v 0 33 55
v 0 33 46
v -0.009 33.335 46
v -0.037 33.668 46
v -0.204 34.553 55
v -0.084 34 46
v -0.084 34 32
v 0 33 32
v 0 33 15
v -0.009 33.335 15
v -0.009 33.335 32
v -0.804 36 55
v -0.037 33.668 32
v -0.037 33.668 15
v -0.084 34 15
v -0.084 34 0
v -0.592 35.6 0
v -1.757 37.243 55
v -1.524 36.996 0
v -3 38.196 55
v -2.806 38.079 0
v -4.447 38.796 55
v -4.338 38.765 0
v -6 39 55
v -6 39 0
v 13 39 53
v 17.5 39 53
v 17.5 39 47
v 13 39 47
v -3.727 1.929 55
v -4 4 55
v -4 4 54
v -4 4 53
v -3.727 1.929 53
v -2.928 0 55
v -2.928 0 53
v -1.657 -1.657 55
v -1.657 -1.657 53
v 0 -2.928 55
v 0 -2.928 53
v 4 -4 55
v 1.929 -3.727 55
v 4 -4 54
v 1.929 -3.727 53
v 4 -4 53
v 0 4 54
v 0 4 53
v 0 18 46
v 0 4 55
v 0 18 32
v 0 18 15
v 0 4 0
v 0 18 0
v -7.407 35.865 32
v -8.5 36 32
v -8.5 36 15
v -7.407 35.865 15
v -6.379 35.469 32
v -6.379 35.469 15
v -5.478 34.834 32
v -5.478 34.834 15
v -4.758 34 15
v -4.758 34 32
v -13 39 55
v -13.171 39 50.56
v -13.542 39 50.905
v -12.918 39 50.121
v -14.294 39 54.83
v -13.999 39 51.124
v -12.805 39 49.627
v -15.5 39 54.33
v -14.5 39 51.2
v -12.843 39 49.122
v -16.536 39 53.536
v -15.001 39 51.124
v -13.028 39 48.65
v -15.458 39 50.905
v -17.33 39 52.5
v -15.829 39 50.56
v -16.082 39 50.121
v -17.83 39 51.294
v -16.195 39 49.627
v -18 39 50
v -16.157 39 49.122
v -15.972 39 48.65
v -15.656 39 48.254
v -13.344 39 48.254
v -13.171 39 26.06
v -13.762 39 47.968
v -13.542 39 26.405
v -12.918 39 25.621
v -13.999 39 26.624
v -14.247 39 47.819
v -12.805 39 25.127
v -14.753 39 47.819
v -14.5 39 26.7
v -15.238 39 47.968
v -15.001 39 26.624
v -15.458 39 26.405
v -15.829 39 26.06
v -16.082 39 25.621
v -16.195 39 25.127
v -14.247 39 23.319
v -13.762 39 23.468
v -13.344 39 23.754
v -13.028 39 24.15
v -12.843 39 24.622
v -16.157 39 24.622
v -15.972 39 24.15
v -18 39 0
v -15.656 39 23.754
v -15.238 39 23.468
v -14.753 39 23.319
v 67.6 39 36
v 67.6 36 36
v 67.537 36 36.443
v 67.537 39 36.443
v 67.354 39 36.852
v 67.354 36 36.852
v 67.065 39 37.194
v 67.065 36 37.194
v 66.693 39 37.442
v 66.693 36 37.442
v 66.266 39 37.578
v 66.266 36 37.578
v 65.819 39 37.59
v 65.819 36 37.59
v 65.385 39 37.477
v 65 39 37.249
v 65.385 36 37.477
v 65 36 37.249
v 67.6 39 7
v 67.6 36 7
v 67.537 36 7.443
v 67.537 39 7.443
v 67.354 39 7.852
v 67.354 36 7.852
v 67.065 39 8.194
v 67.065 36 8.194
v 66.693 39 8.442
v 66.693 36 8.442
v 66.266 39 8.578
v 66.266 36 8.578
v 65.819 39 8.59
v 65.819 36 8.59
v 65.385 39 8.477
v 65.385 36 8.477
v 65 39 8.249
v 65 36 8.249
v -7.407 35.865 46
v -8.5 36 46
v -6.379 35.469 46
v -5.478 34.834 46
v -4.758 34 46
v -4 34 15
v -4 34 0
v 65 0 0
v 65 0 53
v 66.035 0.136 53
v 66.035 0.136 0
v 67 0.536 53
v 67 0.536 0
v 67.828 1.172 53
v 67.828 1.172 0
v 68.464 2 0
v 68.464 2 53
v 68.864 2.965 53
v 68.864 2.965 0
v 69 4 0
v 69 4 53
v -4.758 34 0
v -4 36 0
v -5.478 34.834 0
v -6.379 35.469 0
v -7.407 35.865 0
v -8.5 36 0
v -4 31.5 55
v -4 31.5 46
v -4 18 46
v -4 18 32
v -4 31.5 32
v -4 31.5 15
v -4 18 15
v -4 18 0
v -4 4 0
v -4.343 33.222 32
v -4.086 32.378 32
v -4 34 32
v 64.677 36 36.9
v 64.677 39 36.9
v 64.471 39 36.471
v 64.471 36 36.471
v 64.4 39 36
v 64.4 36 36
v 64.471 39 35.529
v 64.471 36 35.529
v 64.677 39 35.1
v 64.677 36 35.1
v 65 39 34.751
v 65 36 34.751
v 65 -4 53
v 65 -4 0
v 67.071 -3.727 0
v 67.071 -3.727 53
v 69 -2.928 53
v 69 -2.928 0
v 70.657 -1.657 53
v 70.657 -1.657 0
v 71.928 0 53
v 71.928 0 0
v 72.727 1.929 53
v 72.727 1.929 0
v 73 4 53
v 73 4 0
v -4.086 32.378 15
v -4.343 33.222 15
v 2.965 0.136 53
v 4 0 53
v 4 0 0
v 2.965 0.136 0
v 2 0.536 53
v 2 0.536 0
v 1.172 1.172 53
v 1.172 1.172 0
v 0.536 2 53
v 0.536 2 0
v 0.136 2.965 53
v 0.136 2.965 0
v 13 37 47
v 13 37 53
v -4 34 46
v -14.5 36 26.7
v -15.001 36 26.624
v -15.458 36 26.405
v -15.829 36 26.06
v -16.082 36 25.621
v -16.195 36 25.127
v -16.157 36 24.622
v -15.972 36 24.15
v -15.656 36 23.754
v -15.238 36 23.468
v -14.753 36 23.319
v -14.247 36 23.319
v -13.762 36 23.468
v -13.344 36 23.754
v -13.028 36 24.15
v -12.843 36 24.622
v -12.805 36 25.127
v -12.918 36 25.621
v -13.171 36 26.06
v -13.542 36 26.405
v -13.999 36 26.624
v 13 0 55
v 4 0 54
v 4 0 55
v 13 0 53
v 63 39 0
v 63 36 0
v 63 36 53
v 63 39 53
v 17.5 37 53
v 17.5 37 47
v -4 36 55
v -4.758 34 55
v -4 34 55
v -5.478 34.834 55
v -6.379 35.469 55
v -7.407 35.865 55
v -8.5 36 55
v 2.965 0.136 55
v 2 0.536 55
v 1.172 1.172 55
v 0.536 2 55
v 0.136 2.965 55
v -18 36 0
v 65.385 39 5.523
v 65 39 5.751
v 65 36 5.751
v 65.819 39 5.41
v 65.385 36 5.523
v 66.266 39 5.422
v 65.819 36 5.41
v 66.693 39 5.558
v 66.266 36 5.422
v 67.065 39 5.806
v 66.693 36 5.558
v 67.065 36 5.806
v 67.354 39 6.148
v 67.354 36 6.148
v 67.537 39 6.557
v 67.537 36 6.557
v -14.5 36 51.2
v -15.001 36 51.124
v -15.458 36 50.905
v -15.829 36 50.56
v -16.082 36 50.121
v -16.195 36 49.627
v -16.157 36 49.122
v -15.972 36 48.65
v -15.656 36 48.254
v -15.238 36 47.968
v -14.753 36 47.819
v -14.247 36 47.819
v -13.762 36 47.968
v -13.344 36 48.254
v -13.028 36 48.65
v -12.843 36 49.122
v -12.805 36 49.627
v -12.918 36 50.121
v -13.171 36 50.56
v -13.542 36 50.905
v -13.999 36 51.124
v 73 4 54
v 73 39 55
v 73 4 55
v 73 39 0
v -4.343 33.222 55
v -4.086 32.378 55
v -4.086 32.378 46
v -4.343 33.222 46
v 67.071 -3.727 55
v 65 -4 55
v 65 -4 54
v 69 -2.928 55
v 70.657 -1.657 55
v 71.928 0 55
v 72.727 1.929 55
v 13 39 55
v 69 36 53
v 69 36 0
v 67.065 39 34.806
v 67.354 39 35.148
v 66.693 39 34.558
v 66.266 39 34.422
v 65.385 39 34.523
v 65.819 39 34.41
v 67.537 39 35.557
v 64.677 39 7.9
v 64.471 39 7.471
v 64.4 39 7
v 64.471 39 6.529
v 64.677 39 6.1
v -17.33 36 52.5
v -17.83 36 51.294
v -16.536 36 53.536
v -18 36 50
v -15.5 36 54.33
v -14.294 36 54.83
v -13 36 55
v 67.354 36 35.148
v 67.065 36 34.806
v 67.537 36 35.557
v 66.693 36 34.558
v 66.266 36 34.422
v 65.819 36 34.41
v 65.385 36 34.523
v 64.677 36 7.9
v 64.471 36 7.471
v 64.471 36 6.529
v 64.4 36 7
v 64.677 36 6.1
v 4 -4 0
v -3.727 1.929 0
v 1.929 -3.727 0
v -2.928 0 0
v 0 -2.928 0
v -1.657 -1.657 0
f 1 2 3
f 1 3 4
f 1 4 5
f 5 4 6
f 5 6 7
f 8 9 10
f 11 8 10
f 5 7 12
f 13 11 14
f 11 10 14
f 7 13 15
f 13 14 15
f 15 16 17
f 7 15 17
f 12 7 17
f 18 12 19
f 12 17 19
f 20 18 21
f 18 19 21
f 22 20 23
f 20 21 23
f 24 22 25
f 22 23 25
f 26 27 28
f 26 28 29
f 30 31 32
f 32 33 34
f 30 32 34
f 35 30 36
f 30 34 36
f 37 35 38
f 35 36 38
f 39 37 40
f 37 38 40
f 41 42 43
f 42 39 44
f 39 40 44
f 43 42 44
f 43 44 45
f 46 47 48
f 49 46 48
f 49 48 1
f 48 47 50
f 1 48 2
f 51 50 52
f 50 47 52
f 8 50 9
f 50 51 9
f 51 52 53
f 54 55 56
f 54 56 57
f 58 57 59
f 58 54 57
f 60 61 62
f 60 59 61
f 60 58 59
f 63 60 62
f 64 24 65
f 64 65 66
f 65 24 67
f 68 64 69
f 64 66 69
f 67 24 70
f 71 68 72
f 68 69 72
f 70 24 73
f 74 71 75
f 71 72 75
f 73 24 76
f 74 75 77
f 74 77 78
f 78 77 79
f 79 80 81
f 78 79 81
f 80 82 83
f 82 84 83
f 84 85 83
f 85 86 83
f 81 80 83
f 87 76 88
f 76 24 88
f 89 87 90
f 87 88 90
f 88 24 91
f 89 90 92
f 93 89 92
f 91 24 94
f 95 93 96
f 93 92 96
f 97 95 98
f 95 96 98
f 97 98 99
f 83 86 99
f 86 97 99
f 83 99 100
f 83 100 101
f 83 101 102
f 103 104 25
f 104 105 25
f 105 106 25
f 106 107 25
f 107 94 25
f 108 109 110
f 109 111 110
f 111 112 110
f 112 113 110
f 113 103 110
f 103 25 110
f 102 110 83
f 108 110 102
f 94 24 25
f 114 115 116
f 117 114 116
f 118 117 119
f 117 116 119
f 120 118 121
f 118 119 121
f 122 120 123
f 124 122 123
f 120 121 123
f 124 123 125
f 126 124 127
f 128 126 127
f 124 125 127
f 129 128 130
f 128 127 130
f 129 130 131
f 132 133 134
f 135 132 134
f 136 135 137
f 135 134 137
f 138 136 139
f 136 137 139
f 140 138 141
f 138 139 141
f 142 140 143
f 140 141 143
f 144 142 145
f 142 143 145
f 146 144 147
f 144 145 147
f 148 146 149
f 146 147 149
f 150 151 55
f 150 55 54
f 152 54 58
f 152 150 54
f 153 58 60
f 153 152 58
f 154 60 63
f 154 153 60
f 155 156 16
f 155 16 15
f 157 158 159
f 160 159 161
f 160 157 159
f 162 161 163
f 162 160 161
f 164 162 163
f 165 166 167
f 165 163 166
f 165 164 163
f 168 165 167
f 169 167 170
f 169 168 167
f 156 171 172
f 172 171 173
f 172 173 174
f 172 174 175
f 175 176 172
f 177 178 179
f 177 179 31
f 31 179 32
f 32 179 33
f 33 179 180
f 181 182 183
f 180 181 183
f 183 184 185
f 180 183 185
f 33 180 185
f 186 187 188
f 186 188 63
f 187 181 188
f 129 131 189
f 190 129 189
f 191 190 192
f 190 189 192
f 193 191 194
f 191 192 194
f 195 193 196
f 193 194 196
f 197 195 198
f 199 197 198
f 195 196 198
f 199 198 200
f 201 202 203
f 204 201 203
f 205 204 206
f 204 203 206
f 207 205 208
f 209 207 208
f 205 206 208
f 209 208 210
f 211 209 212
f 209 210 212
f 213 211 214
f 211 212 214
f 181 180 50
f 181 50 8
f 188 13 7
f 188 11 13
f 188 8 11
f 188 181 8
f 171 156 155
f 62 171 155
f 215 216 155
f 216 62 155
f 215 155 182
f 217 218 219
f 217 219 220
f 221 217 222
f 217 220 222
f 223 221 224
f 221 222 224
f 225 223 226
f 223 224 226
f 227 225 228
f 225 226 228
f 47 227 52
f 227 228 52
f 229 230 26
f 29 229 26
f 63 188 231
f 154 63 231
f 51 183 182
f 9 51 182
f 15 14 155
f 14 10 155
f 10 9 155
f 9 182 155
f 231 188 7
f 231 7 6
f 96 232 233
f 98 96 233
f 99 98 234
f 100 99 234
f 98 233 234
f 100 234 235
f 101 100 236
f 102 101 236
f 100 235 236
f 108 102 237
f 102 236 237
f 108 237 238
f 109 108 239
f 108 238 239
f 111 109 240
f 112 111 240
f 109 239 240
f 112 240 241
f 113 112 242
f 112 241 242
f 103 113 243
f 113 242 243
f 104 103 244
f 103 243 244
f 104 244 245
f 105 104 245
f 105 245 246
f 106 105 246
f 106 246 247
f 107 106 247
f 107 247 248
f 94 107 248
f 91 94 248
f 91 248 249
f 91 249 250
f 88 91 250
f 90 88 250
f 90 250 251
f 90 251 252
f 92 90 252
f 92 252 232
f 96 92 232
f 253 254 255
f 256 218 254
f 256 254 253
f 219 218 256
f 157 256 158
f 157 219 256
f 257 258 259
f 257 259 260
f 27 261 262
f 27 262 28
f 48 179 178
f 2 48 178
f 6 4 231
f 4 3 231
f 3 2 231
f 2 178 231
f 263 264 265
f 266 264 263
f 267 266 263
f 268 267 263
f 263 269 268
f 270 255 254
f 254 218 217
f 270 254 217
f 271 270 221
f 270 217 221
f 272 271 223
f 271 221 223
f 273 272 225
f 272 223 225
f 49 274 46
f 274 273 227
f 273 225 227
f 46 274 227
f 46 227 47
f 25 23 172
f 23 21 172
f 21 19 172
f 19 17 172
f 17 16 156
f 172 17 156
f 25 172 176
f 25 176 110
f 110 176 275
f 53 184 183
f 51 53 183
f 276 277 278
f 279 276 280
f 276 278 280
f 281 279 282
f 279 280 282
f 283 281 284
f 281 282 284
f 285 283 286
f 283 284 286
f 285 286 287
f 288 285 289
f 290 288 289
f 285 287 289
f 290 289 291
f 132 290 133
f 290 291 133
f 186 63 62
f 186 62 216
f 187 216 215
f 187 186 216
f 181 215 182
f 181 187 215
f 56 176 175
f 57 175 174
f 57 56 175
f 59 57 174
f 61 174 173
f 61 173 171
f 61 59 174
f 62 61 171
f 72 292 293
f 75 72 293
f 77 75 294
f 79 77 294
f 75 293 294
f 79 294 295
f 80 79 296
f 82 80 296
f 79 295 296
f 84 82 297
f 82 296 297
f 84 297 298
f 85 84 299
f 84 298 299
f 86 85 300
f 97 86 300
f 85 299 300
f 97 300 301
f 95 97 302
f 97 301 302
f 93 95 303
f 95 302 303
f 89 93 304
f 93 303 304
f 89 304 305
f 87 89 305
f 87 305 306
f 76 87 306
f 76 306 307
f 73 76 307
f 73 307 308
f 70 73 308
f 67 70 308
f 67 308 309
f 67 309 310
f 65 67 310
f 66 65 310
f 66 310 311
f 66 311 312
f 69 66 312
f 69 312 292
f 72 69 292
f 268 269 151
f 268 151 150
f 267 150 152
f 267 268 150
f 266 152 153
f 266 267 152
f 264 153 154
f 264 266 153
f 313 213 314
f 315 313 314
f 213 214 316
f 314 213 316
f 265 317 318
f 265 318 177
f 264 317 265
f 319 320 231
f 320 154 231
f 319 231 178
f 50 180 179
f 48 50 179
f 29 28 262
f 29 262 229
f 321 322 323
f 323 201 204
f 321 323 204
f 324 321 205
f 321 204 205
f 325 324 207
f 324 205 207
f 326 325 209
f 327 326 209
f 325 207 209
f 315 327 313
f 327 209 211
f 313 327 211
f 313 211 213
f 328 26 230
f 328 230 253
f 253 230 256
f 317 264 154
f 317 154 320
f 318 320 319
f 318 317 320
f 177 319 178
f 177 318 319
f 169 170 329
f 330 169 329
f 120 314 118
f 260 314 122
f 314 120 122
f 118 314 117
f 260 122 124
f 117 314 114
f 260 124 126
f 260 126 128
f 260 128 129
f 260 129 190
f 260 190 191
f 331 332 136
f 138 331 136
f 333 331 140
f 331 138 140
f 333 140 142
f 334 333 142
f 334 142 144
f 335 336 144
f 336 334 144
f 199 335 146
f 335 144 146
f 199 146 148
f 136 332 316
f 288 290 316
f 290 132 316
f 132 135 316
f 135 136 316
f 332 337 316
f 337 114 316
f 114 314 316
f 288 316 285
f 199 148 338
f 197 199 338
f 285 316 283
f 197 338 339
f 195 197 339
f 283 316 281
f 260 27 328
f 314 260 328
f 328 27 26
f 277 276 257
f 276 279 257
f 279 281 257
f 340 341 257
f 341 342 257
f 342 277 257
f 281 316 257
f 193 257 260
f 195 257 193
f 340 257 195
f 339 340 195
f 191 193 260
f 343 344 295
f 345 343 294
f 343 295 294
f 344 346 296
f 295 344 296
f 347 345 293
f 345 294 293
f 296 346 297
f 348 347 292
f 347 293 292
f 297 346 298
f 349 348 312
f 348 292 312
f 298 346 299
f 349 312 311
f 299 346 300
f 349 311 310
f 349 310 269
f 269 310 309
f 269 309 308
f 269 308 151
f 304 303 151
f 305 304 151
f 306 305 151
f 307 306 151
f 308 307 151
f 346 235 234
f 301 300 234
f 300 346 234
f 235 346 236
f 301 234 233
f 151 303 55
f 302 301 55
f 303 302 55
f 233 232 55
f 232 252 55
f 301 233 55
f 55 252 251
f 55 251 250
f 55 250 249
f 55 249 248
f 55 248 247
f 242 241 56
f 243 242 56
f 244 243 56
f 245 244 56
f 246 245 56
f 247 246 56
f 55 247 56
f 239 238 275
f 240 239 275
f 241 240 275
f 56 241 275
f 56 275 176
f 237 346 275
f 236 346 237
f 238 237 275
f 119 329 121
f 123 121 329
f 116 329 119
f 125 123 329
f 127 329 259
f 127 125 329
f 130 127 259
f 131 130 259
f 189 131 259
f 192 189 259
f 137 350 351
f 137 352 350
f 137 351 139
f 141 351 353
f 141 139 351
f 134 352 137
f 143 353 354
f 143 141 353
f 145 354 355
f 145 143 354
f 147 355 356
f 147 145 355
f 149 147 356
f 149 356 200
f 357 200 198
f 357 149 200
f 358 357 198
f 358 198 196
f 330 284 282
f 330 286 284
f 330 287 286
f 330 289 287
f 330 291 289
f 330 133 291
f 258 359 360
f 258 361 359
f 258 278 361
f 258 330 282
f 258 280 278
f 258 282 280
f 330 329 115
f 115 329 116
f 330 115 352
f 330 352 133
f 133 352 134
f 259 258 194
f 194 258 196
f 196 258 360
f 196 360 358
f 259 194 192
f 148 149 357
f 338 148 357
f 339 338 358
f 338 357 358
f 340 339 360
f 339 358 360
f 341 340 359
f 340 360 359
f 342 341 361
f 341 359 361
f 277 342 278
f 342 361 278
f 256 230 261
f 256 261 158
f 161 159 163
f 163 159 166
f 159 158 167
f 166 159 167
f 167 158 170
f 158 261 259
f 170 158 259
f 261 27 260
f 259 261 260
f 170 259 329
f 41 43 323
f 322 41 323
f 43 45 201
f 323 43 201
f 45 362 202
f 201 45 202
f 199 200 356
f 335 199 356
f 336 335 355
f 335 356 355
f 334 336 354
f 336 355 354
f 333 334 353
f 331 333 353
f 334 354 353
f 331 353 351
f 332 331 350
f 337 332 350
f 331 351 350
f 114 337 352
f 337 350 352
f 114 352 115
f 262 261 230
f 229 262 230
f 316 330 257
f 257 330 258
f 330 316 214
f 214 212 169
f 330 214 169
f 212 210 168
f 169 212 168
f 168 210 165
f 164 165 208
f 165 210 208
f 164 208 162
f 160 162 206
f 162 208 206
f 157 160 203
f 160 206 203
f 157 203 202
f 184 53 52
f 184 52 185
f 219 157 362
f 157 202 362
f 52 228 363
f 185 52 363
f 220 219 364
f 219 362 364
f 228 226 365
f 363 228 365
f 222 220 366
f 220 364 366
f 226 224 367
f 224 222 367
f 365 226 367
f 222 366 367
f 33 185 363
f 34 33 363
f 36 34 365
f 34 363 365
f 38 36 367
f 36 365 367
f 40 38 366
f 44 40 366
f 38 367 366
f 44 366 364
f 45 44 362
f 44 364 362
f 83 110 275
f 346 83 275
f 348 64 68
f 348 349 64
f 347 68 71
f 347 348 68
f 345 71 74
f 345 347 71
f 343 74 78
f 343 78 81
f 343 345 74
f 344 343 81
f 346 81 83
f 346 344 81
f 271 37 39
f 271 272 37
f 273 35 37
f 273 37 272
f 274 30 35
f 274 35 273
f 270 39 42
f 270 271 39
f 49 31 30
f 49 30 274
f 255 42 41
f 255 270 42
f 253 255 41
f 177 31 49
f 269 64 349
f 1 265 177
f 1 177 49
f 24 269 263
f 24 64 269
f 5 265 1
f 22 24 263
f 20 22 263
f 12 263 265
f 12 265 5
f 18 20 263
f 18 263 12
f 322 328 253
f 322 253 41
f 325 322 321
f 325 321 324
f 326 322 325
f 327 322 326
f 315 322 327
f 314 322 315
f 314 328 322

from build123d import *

# Parameters (mm, degrees)
EXTRUDE_1_DEPTH      = 54
EXTRUDE_START        = -2
EXTRUDE_2_DEPTH      = 2
SKETCH_2_R           = 1.7
SKETCH_2_W           = 14
SKETCH_2_H           = 2
SKETCH_2_W_2         = 8
SKETCH_2_W_3         = 61
CUT_EXTRUDE_1_DEPTH  = 101.468900661
CUT_EXTRUDE_2_REACH  = 103.814
SKETCH_3_W           = 15
SKETCH_3_H           = 16
SKETCH_3_W_2         = 14
CUT_EXTRUDE_START    = -40
CUT_EXTRUDE_5_DEPTH  = 61.468900661
EXTRUDE_3_DEPTH      = 1
EXTRUDE_3_DEPTH_BACK = 1
SKETCH_6_W           = 4.5
SKETCH_6_H           = 2
EXTRUDE_4_DEPTH      = 6
FILLET_1_R           = 4.5
FILLET_2_R           = 6
FILLET_3_R           = 5


with BuildPart() as part:
    # 草图1 → 凸台-拉伸1 (new body)
    with BuildSketch(Plane.XY):
        with BuildLine():
            ThreePointArc((4, -4), (-1.656854249, -1.656854249), (-4, 4))
            Line((-4, 4), (-4, 36))
            Line((-4, 36), (-18, 36))
            Line((-18, 36), (-18, 39))
            Line((-18, 39), (0, 39))
            Line((0, 39), (0, 4))
            ThreePointArc((0, 4), (1.171572875, 1.171572875), (4, 0))
            Line((4, 0), (65, 0))
            ThreePointArc((65, 0), (67.828427125, 1.171572875), (69, 4))
            Line((69, 4), (69, 36))
            Line((69, 36), (63, 36))
            Line((63, 36), (63, 39))
            Line((63, 39), (73, 39))
            Line((73, 39), (73, 4))
            ThreePointArc((73, 4), (70.656854249, -1.656854249), (65, -4))
            Line((65, -4), (4, -4))
        make_face()
    extrude(amount=EXTRUDE_1_DEPTH)

    # 草图1<3> → 凸台-拉伸2 (add)
    with BuildSketch(Plane.XY.offset(EXTRUDE_START)):
        with BuildLine():
            Line((4, 0), (65, 0))
            ThreePointArc((65, 0), (67.828427125, 1.171572875), (69, 4))
            Line((69, 4), (69, 36))
            Line((69, 36), (63, 36))
            Line((63, 36), (63, 39))
            Line((63, 39), (0, 39))
            Line((0, 39), (0, 4))
            ThreePointArc((0, 4), (1.171572875, 1.171572875), (4, 0))
        make_face()
        with BuildLine():
            ThreePointArc((4, -4), (-1.656854249, -1.656854249), (-4, 4))
            Line((-4, 4), (-4, 36))
            Line((-4, 36), (-18, 36))
            Line((-18, 36), (-18, 39))
            Line((-18, 39), (0, 39))
            Line((0, 39), (0, 4))
            ThreePointArc((0, 4), (1.171572875, 1.171572875), (4, 0))
            Line((4, 0), (65, 0))
            ThreePointArc((65, 0), (67.828427125, 1.171572875), (69, 4))
            Line((69, 4), (69, 36))
            Line((69, 36), (63, 36))
            Line((63, 36), (63, 39))
            Line((63, 39), (73, 39))
            Line((73, 39), (73, 4))
            ThreePointArc((73, 4), (70.656854249, -1.656854249), (65, -4))
            Line((65, -4), (4, -4))
        make_face()
    extrude(amount=EXTRUDE_2_DEPTH)

    # 草图2 → 切除-拉伸1 (cut, through all)
    with BuildSketch(Plane.XZ.offset(4)):
        with Locations(Location((-14.5, 49.5, 0), (0, 0, 90))):
            Circle(SKETCH_2_R)
        with Locations(Location((-14.5, 25, 0), (0, 0, 90))):
            Circle(SKETCH_2_R)
        with Locations((-11, -1)):
            Rectangle(SKETCH_2_W, SKETCH_2_H)
        with Locations((0, -1)):
            Rectangle(SKETCH_2_W_2, SKETCH_2_H)
        with Locations((34.5, -1)):
            Rectangle(SKETCH_2_W_3, SKETCH_2_H)
        with Locations((69, -1)):
            Rectangle(SKETCH_2_W_2, SKETCH_2_H)
    extrude(amount=-CUT_EXTRUDE_1_DEPTH, mode=Mode.SUBTRACT)

    # 草图3 → 切除-拉伸2 (cut, up to next)
    with BuildSketch(Plane.ZY.offset(4), mode=Mode.PRIVATE) as cut_extrude_2_sk1:
        with Locations((7.5, 26)):
            Rectangle(SKETCH_3_W, SKETCH_3_H)
    cut_extrude_2_tool1 = extrude(cut_extrude_2_sk1.sketch, amount=-CUT_EXTRUDE_2_REACH, mode=Mode.PRIVATE) & part.part
    # 草图3 → 切除-拉伸2 (cut, up to next)
    with BuildSketch(Plane.ZY.offset(4), mode=Mode.PRIVATE) as cut_extrude_2_sk2:
        with Locations((39, 26)):
            Rectangle(SKETCH_3_W_2, SKETCH_3_H)
    cut_extrude_2_tool2 = extrude(cut_extrude_2_sk2.sketch, amount=-CUT_EXTRUDE_2_REACH, mode=Mode.PRIVATE) & part.part
    add(cut_extrude_2_tool1.solids().sort_by_distance((-4, 26, 7.5))[0], mode=Mode.SUBTRACT)
    add(cut_extrude_2_tool2.solids().sort_by_distance((-4, 26, 39))[0], mode=Mode.SUBTRACT)

    # 草图2<3> → 切除-拉伸5 (cut, through all)
    with BuildSketch(Plane.XZ.offset(4).offset(CUT_EXTRUDE_START)):
        with BuildLine():
            ThreePointArc((65, 37.2489996), (64.4, 36), (65, 34.7510004))
            Line((65, 34.7510004), (65, 37.2489996))
        make_face()
        with BuildLine():
            Line((65, 37.2489996), (65, 34.7510004))
            ThreePointArc((65, 34.7510004), (66.692820323, 34.55777949), (67.6, 36))
            ThreePointArc((67.6, 36), (66.692820323, 37.44222051), (65, 37.2489996))
        make_face()
        with BuildLine():
            ThreePointArc((65, 8.2489996), (64.4, 7), (65, 5.7510004))
            Line((65, 5.7510004), (65, 8.2489996))
        make_face()
        with BuildLine():
            Line((65, 8.2489996), (65, 5.7510004))
            ThreePointArc((65, 5.7510004), (66.692820323, 5.55777949), (67.6, 7))
            ThreePointArc((67.6, 7), (66.692820323, 8.44222051), (65, 8.2489996))
        make_face()
    extrude(amount=-CUT_EXTRUDE_5_DEPTH, mode=Mode.SUBTRACT)

    # 草图5 → 凸台-拉伸3 (add, two sides: drawn at the far end of the back side and taken through both)
    with BuildSketch(Plane.XY.offset(54).offset(-EXTRUDE_3_DEPTH_BACK)):
        with BuildLine():
            Line((73, 39), (63, 39))
            Line((63, 39), (63, 36))
            Line((63, 36), (69, 36))
            Line((69, 36), (69, 4))
            ThreePointArc((69, 4), (67.828427125, 1.171572875), (65, 0))
            Line((65, 0), (13, 0))
            Line((13, 0), (13, -4))
            Line((13, -4), (65, -4))
            ThreePointArc((65, -4), (70.656854249, -1.656854249), (73, 4))
            Line((73, 4), (73, 39))
        make_face()
        with BuildLine():
            Line((63, 39), (13, 39))
            Line((13, 39), (13, 0))
            Line((13, 0), (65, 0))
            ThreePointArc((65, 0), (67.828427125, 1.171572875), (69, 4))
            Line((69, 4), (69, 36))
            Line((69, 36), (63, 36))
            Line((63, 36), (63, 39))
        make_face()
        with BuildLine():
            Line((0, 4), (0, 39))
            Line((0, 39), (-18, 39))
            Line((-18, 39), (-18, 36))
            Line((-18, 36), (-4, 36))
            Line((-4, 36), (-4, 4))
            ThreePointArc((-4, 4), (-1.656854249, -1.656854249), (4, -4))
            Line((4, -4), (13, -4))
            Line((13, -4), (13, 0))
            Line((13, 0), (4, 0))
            ThreePointArc((4, 0), (1.171572875, 1.171572875), (0, 4))
        make_face()
    extrude(amount=EXTRUDE_3_DEPTH + EXTRUDE_3_DEPTH_BACK)

    # 草图6 → 凸台-拉伸4 (add)
    with BuildSketch(Plane(origin=(0, 0, 53), x_dir=(-1, 0, 0), z_dir=(0, 0, -1))):
        with Locations((-15.25, 38)):
            Rectangle(SKETCH_6_W, SKETCH_6_H)
    extrude(amount=EXTRUDE_4_DEPTH)

    # 圆角1
    # the kernel refuses this fillet: 4.5 mm, written as the material it adds along each edge
    with BuildSketch(Plane(origin=(-4, 36, 55), x_dir=(0, -1, 0), z_dir=(0, 0, -1))) as fillet_1_piece_1_section:
        with BuildLine():
            CenterArc((FILLET_1_R, FILLET_1_R), FILLET_1_R, 180, 90)
            Line((0, FILLET_1_R), (0, 0))
            Line((0, 0), (FILLET_1_R, 0))
        make_face()
    fillet_1_piece_1 = extrude(amount=55, mode=Mode.PRIVATE)
    fillet_1_piece_1 = split(fillet_1_piece_1, bisect_by=Plane(origin=(-4.151275194, 34, 50.5), z_dir=(0, -1, 0)), keep=Keep.TOP, mode=Mode.PRIVATE)
    fillet_1_piece_1 = split(fillet_1_piece_1, bisect_by=Plane(origin=(-4.151275194, 33.214431026, 46), z_dir=(0, 0, 1)), keep=Keep.TOP, mode=Mode.PRIVATE)
    add(fillet_1_piece_1)
    with BuildSketch(Plane(origin=(-4, 36, 55), x_dir=(0, -1, 0), z_dir=(0, 0, -1))) as fillet_1_piece_2_section:
        with BuildLine():
            CenterArc((FILLET_1_R, FILLET_1_R), FILLET_1_R, 180, 90)
            Line((0, FILLET_1_R), (0, 0))
            Line((0, 0), (FILLET_1_R, 0))
        make_face()
    fillet_1_piece_2 = extrude(amount=55, mode=Mode.PRIVATE)
    fillet_1_piece_2 = split(fillet_1_piece_2, bisect_by=Plane(origin=(-5.185873222, 34, 50.5), z_dir=(0, 1, 0)), keep=Keep.TOP, mode=Mode.PRIVATE)
    fillet_1_piece_2 = split(fillet_1_piece_2, bisect_by=Plane(origin=(-5.185873222, 35.321534772, 46), z_dir=(0, 0, 1)), keep=Keep.TOP, mode=Mode.PRIVATE)
    add(fillet_1_piece_2)
    with BuildSketch(Plane(origin=(-4, 36, 55), x_dir=(0, -1, 0), z_dir=(0, 0, -1))) as fillet_1_piece_3_section:
        with BuildLine():
            CenterArc((FILLET_1_R, FILLET_1_R), FILLET_1_R, 180, 90)
            Line((0, FILLET_1_R), (0, 0))
            Line((0, 0), (FILLET_1_R, 0))
        make_face()
    fillet_1_piece_3 = extrude(amount=55, mode=Mode.PRIVATE)
    fillet_1_piece_3 = split(fillet_1_piece_3, bisect_by=Plane(origin=(-5.185873222, 34, 39), z_dir=(0, 1, 0)), keep=Keep.TOP, mode=Mode.PRIVATE)
    fillet_1_piece_3 = split(fillet_1_piece_3, bisect_by=Plane(origin=(-5.185873222, 35.321534772, 46), z_dir=(0, 0, -1)), keep=Keep.TOP, mode=Mode.PRIVATE)
    fillet_1_piece_3 = split(fillet_1_piece_3, bisect_by=Plane(origin=(-5.185873222, 35.321534772, 32), z_dir=(0, 0, 1)), keep=Keep.TOP, mode=Mode.PRIVATE)
    add(fillet_1_piece_3)
    with BuildSketch(Plane(origin=(-4, 36, 55), x_dir=(0, -1, 0), z_dir=(0, 0, -1))) as fillet_1_piece_4_section:
        with BuildLine():
            CenterArc((FILLET_1_R, FILLET_1_R), FILLET_1_R, 180, 90)
            Line((0, FILLET_1_R), (0, 0))
            Line((0, 0), (FILLET_1_R, 0))
        make_face()
    fillet_1_piece_4 = extrude(amount=55, mode=Mode.PRIVATE)
    fillet_1_piece_4 = split(fillet_1_piece_4, bisect_by=Plane(origin=(-4.151275194, 34, 23.5), z_dir=(0, -1, 0)), keep=Keep.TOP, mode=Mode.PRIVATE)
    fillet_1_piece_4 = split(fillet_1_piece_4, bisect_by=Plane(origin=(-4.151275194, 33.214431026, 15), z_dir=(0, 0, 1)), keep=Keep.TOP, mode=Mode.PRIVATE)
    fillet_1_piece_4 = split(fillet_1_piece_4, bisect_by=Plane(origin=(-4.151275194, 33.214431026, 32), z_dir=(0, 0, -1)), keep=Keep.TOP, mode=Mode.PRIVATE)
    add(fillet_1_piece_4)
    with BuildSketch(Plane(origin=(-4, 36, 55), x_dir=(0, -1, 0), z_dir=(0, 0, -1))) as fillet_1_piece_5_section:
        with BuildLine():
            CenterArc((FILLET_1_R, FILLET_1_R), FILLET_1_R, 180, 90)
            Line((0, FILLET_1_R), (0, 0))
            Line((0, 0), (FILLET_1_R, 0))
        make_face()
    fillet_1_piece_5 = extrude(amount=55, mode=Mode.PRIVATE)
    fillet_1_piece_5 = split(fillet_1_piece_5, bisect_by=Plane(origin=(-5.185873222, 34, 23.5), z_dir=(0, 1, 0)), keep=Keep.TOP, mode=Mode.PRIVATE)
    fillet_1_piece_5 = split(fillet_1_piece_5, bisect_by=Plane(origin=(-5.185873222, 35.321534772, 15), z_dir=(0, 0, 1)), keep=Keep.TOP, mode=Mode.PRIVATE)
    fillet_1_piece_5 = split(fillet_1_piece_5, bisect_by=Plane(origin=(-5.185873222, 35.321534772, 32), z_dir=(0, 0, -1)), keep=Keep.TOP, mode=Mode.PRIVATE)
    add(fillet_1_piece_5)
    with BuildSketch(Plane(origin=(-4, 36, 55), x_dir=(0, -1, 0), z_dir=(0, 0, -1))) as fillet_1_piece_6_section:
        with BuildLine():
            CenterArc((FILLET_1_R, FILLET_1_R), FILLET_1_R, 180, 90)
            Line((0, FILLET_1_R), (0, 0))
            Line((0, 0), (FILLET_1_R, 0))
        make_face()
    fillet_1_piece_6 = extrude(amount=55, mode=Mode.PRIVATE)
    fillet_1_piece_6 = split(fillet_1_piece_6, bisect_by=Plane(origin=(-5.185873222, 34, 7.5), z_dir=(0, 1, 0)), keep=Keep.TOP, mode=Mode.PRIVATE)
    fillet_1_piece_6 = split(fillet_1_piece_6, bisect_by=Plane(origin=(-5.185873222, 35.321534772, 15), z_dir=(0, 0, -1)), keep=Keep.TOP, mode=Mode.PRIVATE)
    add(fillet_1_piece_6)

    # 圆角2
    # the kernel refuses this fillet: 6 mm, written as the material it takes off along each edge
    with BuildSketch(Plane(origin=(0, 39, -15), x_dir=(-1, 0, 0), z_dir=(0, 0, 1))) as fillet_2_piece_1:
        with BuildLine():
            CenterArc((FILLET_2_R, FILLET_2_R), FILLET_2_R, 180, 90)
            Line((0, FILLET_2_R), (0, 0))
            Line((0, 0), (FILLET_2_R, 0))
        make_face()
    extrude(amount=85, mode=Mode.SUBTRACT)

    # 圆角3
    fillet_3_edges = [part.edges().sort_by_distance(p)[0] for p in [
        (-18, 37.5, 55),
    ]]
    fillet(fillet_3_edges, radius=FILLET_3_R)


solid = part.part
